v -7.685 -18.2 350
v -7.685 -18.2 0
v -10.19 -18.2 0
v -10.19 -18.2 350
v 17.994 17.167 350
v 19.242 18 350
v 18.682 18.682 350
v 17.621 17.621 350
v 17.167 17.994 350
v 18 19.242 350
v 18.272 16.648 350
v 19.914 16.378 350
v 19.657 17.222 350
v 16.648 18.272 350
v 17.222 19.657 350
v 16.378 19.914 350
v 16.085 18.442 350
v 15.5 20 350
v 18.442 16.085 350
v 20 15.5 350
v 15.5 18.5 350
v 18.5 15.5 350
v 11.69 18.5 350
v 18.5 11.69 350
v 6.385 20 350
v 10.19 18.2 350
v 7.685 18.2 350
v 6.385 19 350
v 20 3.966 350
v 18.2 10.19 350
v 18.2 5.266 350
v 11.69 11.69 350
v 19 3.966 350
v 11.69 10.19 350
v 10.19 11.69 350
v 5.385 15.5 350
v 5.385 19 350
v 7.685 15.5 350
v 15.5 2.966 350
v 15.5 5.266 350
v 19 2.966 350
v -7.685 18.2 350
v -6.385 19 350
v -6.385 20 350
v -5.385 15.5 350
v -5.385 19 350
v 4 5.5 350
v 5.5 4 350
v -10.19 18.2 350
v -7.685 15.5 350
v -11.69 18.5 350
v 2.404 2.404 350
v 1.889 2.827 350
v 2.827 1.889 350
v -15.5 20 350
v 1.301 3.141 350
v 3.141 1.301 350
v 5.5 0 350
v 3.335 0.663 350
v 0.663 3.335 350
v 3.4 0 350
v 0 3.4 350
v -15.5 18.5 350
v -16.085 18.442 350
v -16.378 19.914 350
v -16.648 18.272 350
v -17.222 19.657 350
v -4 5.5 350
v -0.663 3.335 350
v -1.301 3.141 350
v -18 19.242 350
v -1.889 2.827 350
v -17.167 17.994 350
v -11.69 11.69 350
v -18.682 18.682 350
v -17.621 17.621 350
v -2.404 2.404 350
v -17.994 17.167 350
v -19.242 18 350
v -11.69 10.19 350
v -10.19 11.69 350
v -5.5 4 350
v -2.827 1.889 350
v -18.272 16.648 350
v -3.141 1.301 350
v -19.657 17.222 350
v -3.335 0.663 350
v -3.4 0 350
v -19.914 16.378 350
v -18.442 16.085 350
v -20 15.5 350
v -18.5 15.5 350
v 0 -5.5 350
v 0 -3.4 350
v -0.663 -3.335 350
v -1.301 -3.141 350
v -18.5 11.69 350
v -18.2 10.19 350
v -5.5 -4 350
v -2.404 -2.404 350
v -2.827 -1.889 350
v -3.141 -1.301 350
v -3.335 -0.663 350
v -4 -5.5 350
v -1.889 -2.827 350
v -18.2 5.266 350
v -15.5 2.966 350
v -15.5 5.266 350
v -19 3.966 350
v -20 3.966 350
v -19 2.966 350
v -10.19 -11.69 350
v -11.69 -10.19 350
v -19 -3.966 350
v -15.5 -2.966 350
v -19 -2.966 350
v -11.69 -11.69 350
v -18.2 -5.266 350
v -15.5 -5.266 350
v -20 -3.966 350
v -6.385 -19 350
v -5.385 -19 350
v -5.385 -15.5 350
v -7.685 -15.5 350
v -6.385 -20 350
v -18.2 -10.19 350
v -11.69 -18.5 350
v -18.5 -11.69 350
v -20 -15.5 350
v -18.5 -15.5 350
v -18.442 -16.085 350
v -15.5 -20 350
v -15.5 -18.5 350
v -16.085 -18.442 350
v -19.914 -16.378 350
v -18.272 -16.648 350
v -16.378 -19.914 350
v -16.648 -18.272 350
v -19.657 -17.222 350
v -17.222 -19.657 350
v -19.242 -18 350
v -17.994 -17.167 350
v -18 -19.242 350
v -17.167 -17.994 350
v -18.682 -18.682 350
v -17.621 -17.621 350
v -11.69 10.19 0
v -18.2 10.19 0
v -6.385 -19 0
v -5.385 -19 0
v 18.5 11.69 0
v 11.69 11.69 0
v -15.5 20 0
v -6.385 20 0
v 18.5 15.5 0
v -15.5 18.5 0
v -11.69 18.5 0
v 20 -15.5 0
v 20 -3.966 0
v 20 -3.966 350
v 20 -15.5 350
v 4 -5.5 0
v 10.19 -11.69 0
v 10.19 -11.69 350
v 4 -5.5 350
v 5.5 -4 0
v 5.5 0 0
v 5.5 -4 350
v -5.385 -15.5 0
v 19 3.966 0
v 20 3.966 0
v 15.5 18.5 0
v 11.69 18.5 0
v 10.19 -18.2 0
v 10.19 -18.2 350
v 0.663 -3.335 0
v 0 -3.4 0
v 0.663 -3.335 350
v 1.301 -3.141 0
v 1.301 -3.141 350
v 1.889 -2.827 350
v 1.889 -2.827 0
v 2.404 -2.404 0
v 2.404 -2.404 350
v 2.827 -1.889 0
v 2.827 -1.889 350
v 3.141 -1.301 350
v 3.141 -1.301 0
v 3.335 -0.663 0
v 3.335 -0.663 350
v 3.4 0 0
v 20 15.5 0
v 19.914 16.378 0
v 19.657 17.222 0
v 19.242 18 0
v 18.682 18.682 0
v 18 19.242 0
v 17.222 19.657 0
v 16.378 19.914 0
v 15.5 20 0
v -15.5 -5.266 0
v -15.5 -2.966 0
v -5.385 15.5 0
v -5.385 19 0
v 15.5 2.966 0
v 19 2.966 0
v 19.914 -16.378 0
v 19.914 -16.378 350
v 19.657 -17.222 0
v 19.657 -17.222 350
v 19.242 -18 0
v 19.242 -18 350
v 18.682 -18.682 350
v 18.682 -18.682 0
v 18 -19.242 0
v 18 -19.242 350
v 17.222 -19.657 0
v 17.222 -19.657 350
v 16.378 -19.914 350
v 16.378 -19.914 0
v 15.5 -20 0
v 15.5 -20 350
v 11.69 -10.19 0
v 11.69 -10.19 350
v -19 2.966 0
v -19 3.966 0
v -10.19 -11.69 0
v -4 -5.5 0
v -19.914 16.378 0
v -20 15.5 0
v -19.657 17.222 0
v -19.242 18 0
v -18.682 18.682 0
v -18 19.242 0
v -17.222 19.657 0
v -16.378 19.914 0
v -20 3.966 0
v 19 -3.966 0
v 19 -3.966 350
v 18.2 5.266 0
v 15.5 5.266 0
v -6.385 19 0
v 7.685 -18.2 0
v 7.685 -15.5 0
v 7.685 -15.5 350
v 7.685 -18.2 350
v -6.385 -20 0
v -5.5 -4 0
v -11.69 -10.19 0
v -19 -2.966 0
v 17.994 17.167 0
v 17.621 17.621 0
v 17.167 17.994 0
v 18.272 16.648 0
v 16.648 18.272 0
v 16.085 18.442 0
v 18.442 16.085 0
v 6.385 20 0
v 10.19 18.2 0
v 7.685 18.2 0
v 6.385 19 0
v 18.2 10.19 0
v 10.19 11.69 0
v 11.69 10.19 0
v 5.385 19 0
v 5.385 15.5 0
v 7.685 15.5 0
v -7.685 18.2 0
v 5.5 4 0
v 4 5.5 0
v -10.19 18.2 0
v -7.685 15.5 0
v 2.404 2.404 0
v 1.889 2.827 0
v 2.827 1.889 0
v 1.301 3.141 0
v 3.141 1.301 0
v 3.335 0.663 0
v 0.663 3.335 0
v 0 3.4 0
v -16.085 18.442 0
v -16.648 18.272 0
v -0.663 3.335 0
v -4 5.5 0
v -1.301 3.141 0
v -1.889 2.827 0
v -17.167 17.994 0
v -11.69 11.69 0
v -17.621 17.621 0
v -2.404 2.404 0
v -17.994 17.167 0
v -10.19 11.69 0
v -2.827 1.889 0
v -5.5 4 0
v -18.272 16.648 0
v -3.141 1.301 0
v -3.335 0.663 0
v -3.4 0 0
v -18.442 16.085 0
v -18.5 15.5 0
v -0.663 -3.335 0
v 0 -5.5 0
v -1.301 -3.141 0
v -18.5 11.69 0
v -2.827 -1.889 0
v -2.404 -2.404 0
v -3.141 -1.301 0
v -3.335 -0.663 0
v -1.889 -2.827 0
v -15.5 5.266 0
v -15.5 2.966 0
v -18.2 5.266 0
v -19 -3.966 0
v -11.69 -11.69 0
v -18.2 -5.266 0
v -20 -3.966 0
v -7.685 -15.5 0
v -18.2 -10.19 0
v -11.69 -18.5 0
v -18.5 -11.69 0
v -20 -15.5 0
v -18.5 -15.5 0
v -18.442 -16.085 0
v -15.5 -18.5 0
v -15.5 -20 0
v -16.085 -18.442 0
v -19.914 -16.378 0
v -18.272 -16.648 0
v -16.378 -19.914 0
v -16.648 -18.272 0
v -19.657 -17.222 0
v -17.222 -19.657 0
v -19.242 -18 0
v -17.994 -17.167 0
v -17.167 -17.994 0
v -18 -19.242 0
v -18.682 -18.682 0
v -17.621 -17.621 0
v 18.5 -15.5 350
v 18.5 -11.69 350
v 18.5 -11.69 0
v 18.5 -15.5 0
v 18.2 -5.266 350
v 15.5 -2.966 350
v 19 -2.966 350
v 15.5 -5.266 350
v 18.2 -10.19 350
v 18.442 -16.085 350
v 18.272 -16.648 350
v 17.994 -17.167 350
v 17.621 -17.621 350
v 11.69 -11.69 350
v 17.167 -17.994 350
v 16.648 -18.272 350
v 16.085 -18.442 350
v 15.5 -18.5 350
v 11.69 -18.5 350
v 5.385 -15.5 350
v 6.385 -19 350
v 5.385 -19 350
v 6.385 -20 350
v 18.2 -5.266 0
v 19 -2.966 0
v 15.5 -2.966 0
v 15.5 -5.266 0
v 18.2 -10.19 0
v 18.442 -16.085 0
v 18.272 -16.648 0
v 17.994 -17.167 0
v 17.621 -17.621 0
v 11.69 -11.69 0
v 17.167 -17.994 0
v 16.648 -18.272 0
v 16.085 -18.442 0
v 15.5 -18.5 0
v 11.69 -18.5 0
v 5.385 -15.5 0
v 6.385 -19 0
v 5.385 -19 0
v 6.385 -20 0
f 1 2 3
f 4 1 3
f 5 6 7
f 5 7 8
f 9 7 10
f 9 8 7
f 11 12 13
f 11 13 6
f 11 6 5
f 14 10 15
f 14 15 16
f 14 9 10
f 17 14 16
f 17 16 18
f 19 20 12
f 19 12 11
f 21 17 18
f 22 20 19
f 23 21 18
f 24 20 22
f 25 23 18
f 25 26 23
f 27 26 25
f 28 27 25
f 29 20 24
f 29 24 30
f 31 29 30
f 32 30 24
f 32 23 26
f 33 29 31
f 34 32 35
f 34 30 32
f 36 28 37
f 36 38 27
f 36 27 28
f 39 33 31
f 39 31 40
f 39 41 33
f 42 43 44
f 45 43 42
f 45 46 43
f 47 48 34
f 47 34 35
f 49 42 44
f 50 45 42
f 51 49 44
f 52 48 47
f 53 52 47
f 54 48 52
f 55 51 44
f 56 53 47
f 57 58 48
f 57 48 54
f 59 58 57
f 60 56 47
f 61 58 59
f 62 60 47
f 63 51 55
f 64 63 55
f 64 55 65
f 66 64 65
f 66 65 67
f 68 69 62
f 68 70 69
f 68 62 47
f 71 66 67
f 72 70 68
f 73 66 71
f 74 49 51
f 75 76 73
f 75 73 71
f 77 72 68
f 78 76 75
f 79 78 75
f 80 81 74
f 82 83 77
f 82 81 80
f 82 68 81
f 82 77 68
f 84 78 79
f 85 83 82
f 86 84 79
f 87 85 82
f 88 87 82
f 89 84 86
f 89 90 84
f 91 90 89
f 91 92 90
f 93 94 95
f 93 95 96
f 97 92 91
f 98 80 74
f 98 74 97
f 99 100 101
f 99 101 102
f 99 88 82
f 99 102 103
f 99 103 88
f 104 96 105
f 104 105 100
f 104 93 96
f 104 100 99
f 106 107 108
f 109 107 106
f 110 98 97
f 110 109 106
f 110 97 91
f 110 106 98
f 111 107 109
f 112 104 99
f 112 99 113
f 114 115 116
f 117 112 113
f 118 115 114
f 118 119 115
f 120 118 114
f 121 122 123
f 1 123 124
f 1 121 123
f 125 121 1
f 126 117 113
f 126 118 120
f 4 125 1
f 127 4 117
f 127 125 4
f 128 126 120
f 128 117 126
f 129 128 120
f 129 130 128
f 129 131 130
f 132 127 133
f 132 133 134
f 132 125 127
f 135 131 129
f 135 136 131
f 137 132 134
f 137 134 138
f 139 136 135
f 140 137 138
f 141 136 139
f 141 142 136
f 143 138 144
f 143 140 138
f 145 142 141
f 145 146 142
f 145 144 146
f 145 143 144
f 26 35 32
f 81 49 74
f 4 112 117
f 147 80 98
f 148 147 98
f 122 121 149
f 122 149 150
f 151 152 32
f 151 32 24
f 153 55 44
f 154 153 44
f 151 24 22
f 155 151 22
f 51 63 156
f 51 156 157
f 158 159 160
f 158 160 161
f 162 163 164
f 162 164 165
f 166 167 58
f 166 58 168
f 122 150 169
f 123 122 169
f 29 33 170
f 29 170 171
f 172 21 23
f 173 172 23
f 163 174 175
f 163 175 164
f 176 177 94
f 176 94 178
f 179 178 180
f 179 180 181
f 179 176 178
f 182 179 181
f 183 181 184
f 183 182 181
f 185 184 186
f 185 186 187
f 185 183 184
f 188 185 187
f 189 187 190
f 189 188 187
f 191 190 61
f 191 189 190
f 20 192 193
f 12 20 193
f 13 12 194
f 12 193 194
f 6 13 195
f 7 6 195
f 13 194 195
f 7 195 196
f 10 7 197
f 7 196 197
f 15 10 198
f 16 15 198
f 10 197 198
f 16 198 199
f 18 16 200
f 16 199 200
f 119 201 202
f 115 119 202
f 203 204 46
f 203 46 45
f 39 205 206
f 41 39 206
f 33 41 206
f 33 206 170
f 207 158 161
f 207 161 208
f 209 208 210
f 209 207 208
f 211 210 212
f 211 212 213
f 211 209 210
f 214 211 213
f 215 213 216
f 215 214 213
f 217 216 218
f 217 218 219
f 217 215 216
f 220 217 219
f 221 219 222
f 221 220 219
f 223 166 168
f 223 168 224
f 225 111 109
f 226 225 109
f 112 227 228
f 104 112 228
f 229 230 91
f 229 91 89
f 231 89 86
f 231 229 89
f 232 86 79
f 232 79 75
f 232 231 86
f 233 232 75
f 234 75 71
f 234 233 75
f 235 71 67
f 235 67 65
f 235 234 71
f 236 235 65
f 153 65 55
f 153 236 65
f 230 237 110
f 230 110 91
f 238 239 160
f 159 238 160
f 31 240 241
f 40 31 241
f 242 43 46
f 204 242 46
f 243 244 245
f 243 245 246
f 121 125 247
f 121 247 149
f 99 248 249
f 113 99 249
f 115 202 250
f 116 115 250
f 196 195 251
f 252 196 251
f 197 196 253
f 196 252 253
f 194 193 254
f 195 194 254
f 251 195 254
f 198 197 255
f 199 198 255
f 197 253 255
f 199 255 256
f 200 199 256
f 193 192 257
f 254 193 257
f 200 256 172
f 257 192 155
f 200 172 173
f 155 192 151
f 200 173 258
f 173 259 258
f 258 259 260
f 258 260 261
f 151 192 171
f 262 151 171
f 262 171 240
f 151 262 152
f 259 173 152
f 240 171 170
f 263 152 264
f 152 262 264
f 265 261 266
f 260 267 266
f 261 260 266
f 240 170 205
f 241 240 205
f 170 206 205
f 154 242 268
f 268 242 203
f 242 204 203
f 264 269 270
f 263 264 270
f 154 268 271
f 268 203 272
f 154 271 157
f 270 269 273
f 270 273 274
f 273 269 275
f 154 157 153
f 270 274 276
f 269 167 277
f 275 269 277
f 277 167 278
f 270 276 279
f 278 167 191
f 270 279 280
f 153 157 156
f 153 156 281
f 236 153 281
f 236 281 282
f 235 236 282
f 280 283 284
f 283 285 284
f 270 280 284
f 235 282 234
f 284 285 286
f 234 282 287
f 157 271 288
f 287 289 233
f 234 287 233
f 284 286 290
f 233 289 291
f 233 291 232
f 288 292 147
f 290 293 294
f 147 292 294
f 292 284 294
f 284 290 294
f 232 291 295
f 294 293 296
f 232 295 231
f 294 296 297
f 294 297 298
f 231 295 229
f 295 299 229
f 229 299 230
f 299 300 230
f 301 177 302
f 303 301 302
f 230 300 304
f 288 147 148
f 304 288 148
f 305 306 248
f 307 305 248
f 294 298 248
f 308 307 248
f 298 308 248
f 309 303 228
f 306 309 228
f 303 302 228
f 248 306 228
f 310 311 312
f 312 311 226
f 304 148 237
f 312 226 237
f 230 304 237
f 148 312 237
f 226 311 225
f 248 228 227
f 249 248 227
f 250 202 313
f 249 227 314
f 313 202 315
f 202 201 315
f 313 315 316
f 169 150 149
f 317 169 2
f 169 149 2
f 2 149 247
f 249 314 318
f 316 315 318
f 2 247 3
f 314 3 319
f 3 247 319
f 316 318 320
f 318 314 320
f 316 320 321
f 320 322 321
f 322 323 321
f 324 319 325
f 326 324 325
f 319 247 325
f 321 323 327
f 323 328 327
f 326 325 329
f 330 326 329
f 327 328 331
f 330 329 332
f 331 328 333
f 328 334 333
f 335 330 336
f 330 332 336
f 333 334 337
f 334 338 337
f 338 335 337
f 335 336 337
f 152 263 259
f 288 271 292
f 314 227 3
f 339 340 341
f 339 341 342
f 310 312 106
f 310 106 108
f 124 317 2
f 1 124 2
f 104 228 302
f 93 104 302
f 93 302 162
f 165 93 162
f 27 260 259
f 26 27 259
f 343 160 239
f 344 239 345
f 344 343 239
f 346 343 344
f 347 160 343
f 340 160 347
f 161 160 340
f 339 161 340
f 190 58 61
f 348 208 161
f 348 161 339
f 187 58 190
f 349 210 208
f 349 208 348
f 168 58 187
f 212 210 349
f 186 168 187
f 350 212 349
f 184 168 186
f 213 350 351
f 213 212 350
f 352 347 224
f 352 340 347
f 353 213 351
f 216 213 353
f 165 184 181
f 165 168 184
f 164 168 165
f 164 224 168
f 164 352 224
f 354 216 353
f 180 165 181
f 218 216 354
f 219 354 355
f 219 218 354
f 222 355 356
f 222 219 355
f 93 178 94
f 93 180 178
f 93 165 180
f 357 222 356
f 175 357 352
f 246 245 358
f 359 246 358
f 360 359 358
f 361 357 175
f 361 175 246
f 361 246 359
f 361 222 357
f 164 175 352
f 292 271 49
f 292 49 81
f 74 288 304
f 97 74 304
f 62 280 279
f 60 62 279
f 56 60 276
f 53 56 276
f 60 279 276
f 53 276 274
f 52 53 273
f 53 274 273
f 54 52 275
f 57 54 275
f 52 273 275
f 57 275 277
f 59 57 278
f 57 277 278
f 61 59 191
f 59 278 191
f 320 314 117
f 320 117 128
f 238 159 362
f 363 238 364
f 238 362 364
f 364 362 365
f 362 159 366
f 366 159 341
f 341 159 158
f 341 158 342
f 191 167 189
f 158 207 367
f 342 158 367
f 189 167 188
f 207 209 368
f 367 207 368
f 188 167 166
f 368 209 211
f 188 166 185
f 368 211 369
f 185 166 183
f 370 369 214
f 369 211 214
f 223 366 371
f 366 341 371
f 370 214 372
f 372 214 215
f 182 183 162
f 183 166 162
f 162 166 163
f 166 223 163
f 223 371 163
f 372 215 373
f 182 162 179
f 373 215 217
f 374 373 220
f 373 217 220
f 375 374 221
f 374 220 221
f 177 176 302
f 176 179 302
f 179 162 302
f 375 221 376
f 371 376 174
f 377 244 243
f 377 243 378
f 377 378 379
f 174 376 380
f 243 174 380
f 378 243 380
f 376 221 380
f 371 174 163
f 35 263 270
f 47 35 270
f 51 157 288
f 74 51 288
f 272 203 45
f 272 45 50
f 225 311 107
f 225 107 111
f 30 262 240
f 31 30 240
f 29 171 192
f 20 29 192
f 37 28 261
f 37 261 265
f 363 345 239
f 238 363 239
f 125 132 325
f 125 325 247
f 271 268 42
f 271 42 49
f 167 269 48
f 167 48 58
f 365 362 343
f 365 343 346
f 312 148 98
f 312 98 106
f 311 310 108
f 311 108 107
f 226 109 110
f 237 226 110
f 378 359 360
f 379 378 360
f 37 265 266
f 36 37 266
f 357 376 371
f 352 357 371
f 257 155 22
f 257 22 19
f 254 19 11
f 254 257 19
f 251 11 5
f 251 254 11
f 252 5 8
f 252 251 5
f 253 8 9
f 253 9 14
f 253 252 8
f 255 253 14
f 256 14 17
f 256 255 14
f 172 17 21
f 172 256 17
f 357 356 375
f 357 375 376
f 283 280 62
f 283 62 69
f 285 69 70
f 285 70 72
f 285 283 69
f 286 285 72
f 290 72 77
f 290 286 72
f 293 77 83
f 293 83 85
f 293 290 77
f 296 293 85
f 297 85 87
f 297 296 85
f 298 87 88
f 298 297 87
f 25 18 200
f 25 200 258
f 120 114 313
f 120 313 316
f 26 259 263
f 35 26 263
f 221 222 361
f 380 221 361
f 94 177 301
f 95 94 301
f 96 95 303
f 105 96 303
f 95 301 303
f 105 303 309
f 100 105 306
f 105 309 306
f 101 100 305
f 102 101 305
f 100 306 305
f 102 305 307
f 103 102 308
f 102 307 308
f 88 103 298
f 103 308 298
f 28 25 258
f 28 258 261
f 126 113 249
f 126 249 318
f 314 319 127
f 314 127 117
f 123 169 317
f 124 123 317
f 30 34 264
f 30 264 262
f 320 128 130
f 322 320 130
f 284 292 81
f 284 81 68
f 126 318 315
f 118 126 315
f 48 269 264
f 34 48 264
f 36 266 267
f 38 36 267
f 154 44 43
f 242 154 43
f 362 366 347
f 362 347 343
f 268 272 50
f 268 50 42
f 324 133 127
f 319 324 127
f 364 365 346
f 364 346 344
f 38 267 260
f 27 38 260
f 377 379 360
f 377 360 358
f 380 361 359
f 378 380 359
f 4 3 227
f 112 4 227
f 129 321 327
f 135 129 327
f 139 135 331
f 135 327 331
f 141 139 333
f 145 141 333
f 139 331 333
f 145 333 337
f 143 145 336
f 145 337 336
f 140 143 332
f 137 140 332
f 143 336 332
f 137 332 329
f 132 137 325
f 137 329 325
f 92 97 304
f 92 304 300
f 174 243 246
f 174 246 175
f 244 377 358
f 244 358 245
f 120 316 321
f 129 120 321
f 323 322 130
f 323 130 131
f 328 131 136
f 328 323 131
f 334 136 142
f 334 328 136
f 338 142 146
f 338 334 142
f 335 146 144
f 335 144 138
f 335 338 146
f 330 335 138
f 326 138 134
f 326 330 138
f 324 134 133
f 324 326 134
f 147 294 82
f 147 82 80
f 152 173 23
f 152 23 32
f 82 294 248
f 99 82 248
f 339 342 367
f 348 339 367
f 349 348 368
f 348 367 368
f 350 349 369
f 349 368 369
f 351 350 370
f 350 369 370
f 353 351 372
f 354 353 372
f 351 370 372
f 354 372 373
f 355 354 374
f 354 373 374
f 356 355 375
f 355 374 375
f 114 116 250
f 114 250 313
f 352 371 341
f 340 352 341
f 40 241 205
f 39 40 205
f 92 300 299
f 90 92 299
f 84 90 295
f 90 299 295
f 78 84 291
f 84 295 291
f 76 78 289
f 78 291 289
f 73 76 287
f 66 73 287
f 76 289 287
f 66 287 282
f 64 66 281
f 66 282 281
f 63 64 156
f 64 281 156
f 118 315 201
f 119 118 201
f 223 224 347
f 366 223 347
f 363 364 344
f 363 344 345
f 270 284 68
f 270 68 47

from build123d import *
from build123d.topology import SkipClean

# Parameters (mm, degrees)
BOSS_EXTRUDE1_DEPTH  = 350
MIRROR3_COPY_1_DEPTH = 350
MIRROR3_COPY_2_DEPTH = 350


with BuildPart() as part:
    # Sketch1 → Boss-Extrude1 (new body)
    with BuildSketch(Plane.XY):
        with BuildLine():
            Line((3.4, 0), (5.5, 0))
            Line((5.5, 0), (5.5, 4))
            Line((5.5, 4), (11.69, 10.19))
            Line((11.69, 10.19), (18.2, 10.19))
            Line((18.2, 10.19), (18.2, 5.265595036))
            Line((18.2, 5.265595036), (15.5, 5.265595036))
            Line((15.5, 5.265595036), (15.5, 2.965595036))
            Line((15.5, 2.965595036), (19, 2.965595036))
            Line((19, 2.965595036), (19, 3.965595036))
            Line((19, 3.965595036), (20, 3.965595036))
            Line((20, 3.965595036), (20, 15.5))
            ThreePointArc((20, 15.5), (18.681980515, 18.681980515), (15.5, 20))
            Line((15.5, 20), (6.385304712, 20))
            Line((6.385304712, 20), (6.385304712, 19))
            Line((6.385304712, 19), (5.385304712, 19))
            Line((5.385304712, 19), (5.385304712, 15.5))
            Line((5.385304712, 15.5), (7.685304712, 15.5))
            Line((7.685304712, 15.5), (7.685304712, 18.2))
            Line((7.685304712, 18.2), (10.19, 18.2))
            Line((10.19, 18.2), (10.19, 11.69))
            Line((10.19, 11.69), (4, 5.5))
            Line((4, 5.5), (0, 5.5))
            Line((0, 5.5), (0, 3.4))
            ThreePointArc((0, 3.4), (2.404163056, 2.404163056), (3.4, 0))
        make_face()
        with BuildLine():
            Line((18.5, 11.69), (18.5, 15.5))
            ThreePointArc((18.5, 15.5), (17.621320344, 17.621320344), (15.5, 18.5))
            Line((15.5, 18.5), (11.69, 18.5))
            Line((11.69, 18.5), (11.69, 11.69))
            Line((11.69, 11.69), (18.5, 11.69))
        make_face(mode=Mode.SUBTRACT)
    boss_extrude1 = extrude(amount=BOSS_EXTRUDE1_DEPTH)

    # Mirror1: Boss-Extrude1 across plane
    add(boss_extrude1.mirror(Plane.ZX))

    # Mirror2: Boss-Extrude1 across plane
    add(boss_extrude1.mirror(Plane(origin=(0, 0, 0), x_dir=(0, 0, 1), z_dir=(1, 0, 0))))

    # Mirror3 copy 1 sketch → Mirror3 copy 1 (add)
    with BuildSketch(Plane(origin=(0, 0, 0), x_dir=(-1, 0, 0), z_dir=(0, 0, 1))):
        with BuildLine():
            Line((3.4, 0), (5.5, 0))
            Line((5.5, 0), (5.5, 4))
            Line((5.5, 4), (11.69, 10.19))
            Line((11.69, 10.19), (18.2, 10.19))
            Line((18.2, 10.19), (18.2, 5.265595036))
            Line((18.2, 5.265595036), (15.5, 5.265595036))
            Line((15.5, 5.265595036), (15.5, 2.965595036))
            Line((15.5, 2.965595036), (19, 2.965595036))
            Line((19, 2.965595036), (19, 3.965595036))
            Line((19, 3.965595036), (20, 3.965595036))
            Line((20, 3.965595036), (20, 15.5))
            ThreePointArc((20, 15.5), (18.681980515, 18.681980515), (15.5, 20))
            Line((15.5, 20), (6.385304712, 20))
            Line((6.385304712, 20), (6.385304712, 19))
            Line((6.385304712, 19), (5.385304712, 19))
            Line((5.385304712, 19), (5.385304712, 15.5))
            Line((5.385304712, 15.5), (7.685304712, 15.5))
            Line((7.685304712, 15.5), (7.685304712, 18.2))
            Line((7.685304712, 18.2), (10.19, 18.2))
            Line((10.19, 18.2), (10.19, 11.69))
            Line((10.19, 11.69), (4, 5.5))
            Line((4, 5.5), (0, 5.5))
            Line((0, 5.5), (0, 3.4))
            ThreePointArc((0, 3.4), (2.404163056, 2.404163056), (3.4, 0))
        make_face()
        with BuildLine():
            Line((18.5, 11.69), (18.5, 15.5))
            ThreePointArc((18.5, 15.5), (17.621320344, 17.621320344), (15.5, 18.5))
            Line((15.5, 18.5), (11.69, 18.5))
            Line((11.69, 18.5), (11.69, 11.69))
            Line((11.69, 11.69), (18.5, 11.69))
        make_face(mode=Mode.SUBTRACT)
    extrude(amount=MIRROR3_COPY_1_DEPTH)

    # Mirror3 copy 2 sketch → Mirror3 copy 2 (add)
    with SkipClean():  # the faces are left unmerged after this step: merging them gives an invalid solid
        with BuildSketch(Plane.XY):
            with BuildLine():
                Line((3.4, 0), (5.5, 0))
                Line((5.5, 0), (5.5, -4))
                Line((5.5, -4), (11.69, -10.19))
                Line((11.69, -10.19), (18.2, -10.19))
                Line((18.2, -10.19), (18.2, -5.265595036))
                Line((18.2, -5.265595036), (15.5, -5.265595036))
                Line((15.5, -5.265595036), (15.5, -2.965595036))
                Line((15.5, -2.965595036), (19, -2.965595036))
                Line((19, -2.965595036), (19, -3.965595036))
                Line((19, -3.965595036), (20, -3.965595036))
                Line((20, -3.965595036), (20, -15.5))
                ThreePointArc((20, -15.5), (18.681980515, -18.681980515), (15.5, -20))
                Line((15.5, -20), (6.385304712, -20))
                Line((6.385304712, -20), (6.385304712, -19))
                Line((6.385304712, -19), (5.385304712, -19))
                Line((5.385304712, -19), (5.385304712, -15.5))
                Line((5.385304712, -15.5), (7.685304712, -15.5))
                Line((7.685304712, -15.5), (7.685304712, -18.2))
                Line((7.685304712, -18.2), (10.19, -18.2))
                Line((10.19, -18.2), (10.19, -11.69))
                Line((10.19, -11.69), (4, -5.5))
                Line((4, -5.5), (0, -5.5))
                Line((0, -5.5), (0, -3.4))
                ThreePointArc((0, -3.4), (2.404163056, -2.404163056), (3.4, 0))
            make_face()
            with BuildLine():
                Line((18.5, -11.69), (18.5, -15.5))
                ThreePointArc((18.5, -15.5), (17.621320344, -17.621320344), (15.5, -18.5))
                Line((15.5, -18.5), (11.69, -18.5))
                Line((11.69, -18.5), (11.69, -11.69))
                Line((11.69, -11.69), (18.5, -11.69))
            make_face(mode=Mode.SUBTRACT)
        extrude(amount=MIRROR3_COPY_2_DEPTH)


solid = part.part
